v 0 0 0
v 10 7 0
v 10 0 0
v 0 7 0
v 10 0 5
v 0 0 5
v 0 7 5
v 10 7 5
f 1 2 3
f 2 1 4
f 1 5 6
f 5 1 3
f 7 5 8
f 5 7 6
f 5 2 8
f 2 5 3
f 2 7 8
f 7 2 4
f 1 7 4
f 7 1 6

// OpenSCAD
CubePoints = [
  [  0,  0,  0 ],  //0
  [ 10,  0,  0 ],  //1
  [ 10,  7,  0 ],  //2
  [  0,  7,  0 ],  //3
  [  0,  0,  5 ],  //4
  [ 10,  0,  5 ],  //5
  [ 10,  7,  5 ],  //6
  [  0,  7,  5 ]   //7
];
  
CubeFaces = [
  [0,1,2,3],  // bottom
  [4,5,1,0],  // front
  [7,6,5,4],  // top
  [5,6,2,1],  // right
  [6,7,3,2],  // back
  [7,4,0,3]   // left
];
  
polyhedron( CubePoints, CubeFaces );
